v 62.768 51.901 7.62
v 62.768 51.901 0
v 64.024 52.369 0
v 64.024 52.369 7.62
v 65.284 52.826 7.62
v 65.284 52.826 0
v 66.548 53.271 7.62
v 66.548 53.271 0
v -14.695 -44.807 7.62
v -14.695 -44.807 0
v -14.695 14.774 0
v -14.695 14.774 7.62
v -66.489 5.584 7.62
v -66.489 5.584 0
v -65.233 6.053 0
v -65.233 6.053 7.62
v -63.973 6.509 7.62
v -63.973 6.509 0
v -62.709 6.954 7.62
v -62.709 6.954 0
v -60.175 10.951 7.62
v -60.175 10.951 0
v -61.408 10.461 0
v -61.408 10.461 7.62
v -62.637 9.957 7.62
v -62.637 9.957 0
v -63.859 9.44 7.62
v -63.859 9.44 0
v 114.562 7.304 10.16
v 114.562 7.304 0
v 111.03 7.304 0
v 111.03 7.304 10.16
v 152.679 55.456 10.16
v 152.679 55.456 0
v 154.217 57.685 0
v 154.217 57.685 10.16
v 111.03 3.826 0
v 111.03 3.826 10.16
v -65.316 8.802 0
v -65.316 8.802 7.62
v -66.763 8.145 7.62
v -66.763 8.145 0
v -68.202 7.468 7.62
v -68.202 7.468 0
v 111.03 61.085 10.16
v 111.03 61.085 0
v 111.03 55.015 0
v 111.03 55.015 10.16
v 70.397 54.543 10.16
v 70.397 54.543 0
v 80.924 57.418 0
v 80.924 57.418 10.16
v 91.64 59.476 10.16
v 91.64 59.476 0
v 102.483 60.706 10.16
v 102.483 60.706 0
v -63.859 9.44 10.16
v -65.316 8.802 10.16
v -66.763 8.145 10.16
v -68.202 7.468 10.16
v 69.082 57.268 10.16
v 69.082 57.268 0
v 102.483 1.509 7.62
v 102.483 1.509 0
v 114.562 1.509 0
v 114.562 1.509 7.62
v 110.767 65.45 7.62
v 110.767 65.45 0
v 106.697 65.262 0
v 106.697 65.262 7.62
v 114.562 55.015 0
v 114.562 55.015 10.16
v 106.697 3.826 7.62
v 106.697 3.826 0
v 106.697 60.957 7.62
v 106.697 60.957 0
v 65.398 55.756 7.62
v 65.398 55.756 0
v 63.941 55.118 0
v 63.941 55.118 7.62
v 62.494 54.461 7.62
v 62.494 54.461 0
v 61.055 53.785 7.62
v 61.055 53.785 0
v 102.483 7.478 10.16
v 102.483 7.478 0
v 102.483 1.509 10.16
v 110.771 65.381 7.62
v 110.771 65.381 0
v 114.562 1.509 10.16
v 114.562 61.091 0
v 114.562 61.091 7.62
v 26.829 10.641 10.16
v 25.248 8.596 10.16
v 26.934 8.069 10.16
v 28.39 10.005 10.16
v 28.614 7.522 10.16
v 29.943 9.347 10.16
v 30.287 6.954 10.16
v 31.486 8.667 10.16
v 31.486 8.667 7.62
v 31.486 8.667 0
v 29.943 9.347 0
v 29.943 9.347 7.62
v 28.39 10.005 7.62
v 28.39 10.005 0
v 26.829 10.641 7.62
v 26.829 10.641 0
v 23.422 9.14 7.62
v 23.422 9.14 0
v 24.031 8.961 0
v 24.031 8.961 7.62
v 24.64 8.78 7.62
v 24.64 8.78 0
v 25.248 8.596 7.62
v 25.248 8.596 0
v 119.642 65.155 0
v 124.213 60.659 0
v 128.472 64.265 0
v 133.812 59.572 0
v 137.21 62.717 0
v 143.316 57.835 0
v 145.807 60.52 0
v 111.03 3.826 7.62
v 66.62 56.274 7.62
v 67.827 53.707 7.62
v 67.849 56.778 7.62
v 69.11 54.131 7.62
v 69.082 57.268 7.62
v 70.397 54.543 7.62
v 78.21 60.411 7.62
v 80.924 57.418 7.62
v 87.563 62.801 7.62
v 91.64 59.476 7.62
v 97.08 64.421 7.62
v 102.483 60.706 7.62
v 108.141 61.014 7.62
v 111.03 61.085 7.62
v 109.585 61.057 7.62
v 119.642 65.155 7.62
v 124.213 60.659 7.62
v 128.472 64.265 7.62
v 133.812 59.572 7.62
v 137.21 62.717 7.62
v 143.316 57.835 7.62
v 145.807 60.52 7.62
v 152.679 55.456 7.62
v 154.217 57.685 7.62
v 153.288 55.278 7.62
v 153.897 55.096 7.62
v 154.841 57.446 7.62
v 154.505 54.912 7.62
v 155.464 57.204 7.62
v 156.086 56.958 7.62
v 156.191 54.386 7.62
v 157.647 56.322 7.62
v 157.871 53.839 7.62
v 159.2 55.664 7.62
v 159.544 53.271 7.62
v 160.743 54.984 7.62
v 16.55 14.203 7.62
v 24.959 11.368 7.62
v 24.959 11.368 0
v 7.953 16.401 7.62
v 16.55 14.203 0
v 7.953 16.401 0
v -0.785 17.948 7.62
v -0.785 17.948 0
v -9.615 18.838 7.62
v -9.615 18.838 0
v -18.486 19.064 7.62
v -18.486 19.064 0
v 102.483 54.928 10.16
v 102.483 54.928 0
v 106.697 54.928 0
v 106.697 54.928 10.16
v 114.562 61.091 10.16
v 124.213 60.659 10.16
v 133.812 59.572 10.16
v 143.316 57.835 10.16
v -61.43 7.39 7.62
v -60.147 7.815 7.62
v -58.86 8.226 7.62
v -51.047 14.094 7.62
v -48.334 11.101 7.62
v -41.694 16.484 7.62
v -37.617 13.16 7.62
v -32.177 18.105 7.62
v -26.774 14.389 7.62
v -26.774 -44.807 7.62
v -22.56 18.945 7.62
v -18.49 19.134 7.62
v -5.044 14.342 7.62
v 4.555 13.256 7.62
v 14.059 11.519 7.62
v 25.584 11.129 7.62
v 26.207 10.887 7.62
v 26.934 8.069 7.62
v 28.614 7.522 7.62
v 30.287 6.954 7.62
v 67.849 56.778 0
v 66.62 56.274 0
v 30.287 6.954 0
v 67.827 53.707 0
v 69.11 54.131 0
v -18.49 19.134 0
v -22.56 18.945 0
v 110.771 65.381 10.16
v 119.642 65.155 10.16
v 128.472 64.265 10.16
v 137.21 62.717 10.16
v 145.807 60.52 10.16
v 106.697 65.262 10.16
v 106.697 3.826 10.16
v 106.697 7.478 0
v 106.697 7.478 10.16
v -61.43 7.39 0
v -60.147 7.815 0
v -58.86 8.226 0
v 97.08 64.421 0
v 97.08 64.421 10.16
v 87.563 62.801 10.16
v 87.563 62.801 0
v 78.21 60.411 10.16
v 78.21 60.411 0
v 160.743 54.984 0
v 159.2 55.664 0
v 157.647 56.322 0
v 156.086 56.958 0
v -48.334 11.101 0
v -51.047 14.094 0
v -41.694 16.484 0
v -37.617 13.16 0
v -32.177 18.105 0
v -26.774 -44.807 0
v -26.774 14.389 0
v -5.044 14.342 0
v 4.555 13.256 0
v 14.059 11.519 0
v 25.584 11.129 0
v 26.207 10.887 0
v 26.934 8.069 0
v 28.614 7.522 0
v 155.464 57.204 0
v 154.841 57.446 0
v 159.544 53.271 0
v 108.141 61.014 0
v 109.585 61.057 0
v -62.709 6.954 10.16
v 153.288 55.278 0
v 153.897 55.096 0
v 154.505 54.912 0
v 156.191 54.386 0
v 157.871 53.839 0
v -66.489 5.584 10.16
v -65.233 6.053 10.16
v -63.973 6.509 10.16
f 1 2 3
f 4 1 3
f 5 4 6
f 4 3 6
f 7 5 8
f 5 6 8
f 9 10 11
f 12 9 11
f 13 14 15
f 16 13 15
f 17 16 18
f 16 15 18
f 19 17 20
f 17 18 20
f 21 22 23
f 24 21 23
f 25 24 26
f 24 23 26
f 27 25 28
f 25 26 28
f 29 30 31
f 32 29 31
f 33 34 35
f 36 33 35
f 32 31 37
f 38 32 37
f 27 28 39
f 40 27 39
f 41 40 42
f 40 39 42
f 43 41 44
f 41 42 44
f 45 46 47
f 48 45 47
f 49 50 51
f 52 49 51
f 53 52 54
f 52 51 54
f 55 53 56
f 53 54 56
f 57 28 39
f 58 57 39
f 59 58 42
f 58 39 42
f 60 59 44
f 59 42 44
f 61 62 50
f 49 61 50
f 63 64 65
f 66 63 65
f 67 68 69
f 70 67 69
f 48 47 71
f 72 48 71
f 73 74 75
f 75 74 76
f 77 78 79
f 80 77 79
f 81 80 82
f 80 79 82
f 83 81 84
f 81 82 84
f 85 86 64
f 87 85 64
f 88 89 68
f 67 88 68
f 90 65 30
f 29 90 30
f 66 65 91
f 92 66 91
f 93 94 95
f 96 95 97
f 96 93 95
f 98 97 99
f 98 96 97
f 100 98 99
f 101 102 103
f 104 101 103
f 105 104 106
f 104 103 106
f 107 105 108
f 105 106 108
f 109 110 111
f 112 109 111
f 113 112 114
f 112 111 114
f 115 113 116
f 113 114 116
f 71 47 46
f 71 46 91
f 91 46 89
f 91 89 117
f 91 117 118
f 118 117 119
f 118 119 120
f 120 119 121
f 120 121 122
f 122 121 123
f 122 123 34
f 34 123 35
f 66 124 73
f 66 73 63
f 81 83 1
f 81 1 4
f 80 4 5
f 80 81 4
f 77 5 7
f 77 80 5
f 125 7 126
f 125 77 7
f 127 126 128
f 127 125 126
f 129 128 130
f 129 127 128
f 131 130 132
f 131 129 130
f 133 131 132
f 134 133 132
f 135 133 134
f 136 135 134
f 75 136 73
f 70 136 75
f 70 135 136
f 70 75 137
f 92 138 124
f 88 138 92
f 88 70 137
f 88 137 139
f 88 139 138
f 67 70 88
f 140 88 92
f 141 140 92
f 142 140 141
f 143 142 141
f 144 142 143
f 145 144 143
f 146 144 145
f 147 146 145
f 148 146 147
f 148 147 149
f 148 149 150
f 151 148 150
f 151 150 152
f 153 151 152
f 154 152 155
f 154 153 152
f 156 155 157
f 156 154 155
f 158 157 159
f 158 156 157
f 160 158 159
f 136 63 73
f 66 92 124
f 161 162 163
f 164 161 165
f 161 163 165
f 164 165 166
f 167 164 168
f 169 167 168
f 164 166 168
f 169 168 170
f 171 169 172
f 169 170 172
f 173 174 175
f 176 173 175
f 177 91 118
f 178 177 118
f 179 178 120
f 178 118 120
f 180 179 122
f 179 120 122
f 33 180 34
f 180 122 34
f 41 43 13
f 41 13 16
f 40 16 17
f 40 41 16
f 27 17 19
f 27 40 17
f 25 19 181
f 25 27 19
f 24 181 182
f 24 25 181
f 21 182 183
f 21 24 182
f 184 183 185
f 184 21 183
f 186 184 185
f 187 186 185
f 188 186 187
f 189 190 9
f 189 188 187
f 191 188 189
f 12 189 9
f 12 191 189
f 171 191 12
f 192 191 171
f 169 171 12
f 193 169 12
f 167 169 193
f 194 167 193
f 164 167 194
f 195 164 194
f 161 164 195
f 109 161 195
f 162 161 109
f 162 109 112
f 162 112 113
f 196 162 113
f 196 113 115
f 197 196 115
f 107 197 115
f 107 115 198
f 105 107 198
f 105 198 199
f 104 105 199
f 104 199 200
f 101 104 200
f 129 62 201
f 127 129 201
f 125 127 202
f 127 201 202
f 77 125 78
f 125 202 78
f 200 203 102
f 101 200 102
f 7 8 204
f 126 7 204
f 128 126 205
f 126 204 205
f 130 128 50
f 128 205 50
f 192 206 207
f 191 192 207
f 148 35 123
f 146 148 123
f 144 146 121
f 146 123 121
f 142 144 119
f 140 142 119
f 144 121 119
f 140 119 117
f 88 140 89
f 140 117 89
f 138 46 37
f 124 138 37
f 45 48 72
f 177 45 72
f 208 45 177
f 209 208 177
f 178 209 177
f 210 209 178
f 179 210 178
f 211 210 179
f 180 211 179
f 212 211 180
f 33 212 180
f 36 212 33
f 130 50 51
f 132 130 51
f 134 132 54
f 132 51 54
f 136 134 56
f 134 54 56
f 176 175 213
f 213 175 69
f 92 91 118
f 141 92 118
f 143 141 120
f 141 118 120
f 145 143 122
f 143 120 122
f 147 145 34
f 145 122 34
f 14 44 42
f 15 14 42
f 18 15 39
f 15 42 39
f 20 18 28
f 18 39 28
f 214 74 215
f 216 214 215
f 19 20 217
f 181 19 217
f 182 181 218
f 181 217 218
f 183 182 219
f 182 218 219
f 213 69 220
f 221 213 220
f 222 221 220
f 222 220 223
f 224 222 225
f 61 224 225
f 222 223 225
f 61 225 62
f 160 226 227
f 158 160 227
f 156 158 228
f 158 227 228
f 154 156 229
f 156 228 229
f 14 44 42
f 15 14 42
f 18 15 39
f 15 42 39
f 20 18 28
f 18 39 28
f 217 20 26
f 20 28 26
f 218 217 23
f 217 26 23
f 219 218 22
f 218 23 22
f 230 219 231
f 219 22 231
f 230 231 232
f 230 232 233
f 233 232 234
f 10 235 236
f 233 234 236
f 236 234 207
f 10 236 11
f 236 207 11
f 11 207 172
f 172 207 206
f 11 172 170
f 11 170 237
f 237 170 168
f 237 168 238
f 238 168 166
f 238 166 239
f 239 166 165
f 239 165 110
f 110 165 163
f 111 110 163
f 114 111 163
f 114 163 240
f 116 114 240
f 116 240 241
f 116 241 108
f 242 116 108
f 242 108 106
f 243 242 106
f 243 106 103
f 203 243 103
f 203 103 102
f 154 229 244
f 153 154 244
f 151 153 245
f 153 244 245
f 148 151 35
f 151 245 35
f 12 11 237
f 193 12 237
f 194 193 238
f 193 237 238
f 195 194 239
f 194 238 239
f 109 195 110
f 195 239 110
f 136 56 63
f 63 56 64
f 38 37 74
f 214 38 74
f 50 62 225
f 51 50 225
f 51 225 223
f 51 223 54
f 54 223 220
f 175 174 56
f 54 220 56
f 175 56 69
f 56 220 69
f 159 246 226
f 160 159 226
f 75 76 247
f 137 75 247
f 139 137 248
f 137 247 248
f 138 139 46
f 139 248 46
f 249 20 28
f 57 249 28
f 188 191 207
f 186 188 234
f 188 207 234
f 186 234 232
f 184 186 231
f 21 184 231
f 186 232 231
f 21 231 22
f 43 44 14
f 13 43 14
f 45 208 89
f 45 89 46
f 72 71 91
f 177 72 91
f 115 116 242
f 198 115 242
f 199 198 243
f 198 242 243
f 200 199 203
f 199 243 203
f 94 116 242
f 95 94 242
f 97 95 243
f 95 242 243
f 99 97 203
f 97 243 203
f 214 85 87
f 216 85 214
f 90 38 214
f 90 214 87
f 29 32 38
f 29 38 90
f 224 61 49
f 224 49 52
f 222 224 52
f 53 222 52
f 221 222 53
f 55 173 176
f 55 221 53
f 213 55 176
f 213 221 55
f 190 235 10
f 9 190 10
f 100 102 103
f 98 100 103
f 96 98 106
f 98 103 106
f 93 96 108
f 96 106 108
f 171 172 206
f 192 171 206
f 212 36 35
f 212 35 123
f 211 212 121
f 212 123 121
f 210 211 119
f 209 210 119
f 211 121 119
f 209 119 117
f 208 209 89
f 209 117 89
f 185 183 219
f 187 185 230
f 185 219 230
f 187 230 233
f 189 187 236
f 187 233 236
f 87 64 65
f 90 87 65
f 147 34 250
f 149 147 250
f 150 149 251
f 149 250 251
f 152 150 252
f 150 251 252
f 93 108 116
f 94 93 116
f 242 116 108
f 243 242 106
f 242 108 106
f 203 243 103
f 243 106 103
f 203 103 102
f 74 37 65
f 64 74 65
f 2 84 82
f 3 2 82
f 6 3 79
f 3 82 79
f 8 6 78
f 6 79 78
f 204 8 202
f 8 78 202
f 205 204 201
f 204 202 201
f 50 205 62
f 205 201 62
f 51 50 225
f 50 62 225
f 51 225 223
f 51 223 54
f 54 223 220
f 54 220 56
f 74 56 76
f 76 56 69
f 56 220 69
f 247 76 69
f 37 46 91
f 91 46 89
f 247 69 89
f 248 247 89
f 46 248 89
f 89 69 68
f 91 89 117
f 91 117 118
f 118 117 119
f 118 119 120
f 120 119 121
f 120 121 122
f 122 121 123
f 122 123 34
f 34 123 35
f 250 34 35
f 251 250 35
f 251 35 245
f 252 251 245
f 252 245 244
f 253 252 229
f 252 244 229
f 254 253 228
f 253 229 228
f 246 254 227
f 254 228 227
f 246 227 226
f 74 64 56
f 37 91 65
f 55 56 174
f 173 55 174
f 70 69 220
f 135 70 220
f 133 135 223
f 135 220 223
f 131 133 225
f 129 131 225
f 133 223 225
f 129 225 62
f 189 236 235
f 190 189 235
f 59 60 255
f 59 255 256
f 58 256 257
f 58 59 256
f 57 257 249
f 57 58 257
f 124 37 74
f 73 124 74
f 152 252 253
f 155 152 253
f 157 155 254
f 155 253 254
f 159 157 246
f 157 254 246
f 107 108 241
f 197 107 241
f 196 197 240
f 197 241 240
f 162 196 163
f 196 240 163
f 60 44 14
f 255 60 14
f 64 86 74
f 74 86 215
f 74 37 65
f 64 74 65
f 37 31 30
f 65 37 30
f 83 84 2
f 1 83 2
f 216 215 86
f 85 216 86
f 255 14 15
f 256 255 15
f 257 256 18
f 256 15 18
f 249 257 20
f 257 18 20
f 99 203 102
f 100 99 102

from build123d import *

# Parameters (mm, degrees)
F1_DEPTH = 10.16
F2_DEPTH = 7.62
F0_W     = 3.5319058225
F0_H     = 47.7113383822
F0_W_2   = 4.2136191335
F0_H_2   = 47.4496674724


with BuildPart() as f1:
    # F0 (on Top) → F1 (new body)
    with BuildSketch(Plane.XY):
        with BuildLine():
            Line((-62.7086196105, 6.9542019628), (-63.859421589, 9.4395052171))
            ThreePointArc((-63.859421589, 9.4395052171), (-66.0405740146, 8.4756323991), (-68.2018846273, 7.4680545367))
            Line((-68.2018846273, 7.4680545367), (-66.4890483022, 5.583927501))
            ThreePointArc((-66.4890483022, 5.583927501), (-64.6036842406, 6.282446105), (-62.7086196105, 6.9542019628))
        make_face()
    extrude(amount=F1_DEPTH)


with BuildPart() as f1b:
    # F0 (on Top) → F1, piece 2 (new body)
    with BuildSketch(Plane.XY):
        with BuildLine():
            Line((30.2866194397, 6.9542019628), (31.4856059849, 8.6670452729))
            ThreePointArc((31.4856059849, 8.6670452729), (29.1676409192, 9.6788361604), (26.828605468, 10.6409151614))
            Line((26.828605468, 10.6409151614), (25.2478323508, 8.5956327954))
            ThreePointArc((25.2478323508, 8.5956327954), (27.774883266, 7.7984236152), (30.2866194397, 6.9542019628))
        make_face()
    extrude(amount=F1_DEPTH)


with BuildPart() as f1c:
    # F0 (on Top) → F1, piece 3 (new body)
    with BuildSketch(Plane.XY):
        with BuildLine():
            Line((106.6968534909, 60.9568862112), (106.6968534909, 65.2615321239))
            ThreePointArc((106.6968534909, 65.2615321239), (87.5631710955, 62.8008556066), (69.0824986497, 57.2675494628))
            Line((69.0824986497, 57.2675494628), (70.3966033264, 54.5431568671))
            ThreePointArc((70.3966033264, 54.5431568671), (86.2621022387, 58.5502032273), (102.4832343575, 60.7055104108))
            ThreePointArc((102.4832343575, 60.7055104108), (104.5891098819, 60.8468549434), (106.6968534909, 60.9568862112))
        make_face()
        with BuildLine():
            Line((106.6968534909, 54.9276508391), (106.6968534909, 60.9568862112))
            ThreePointArc((106.6968534909, 60.9568862112), (104.5891098819, 60.8468549434), (102.4832343575, 60.7055104108))
            Line((102.4832343575, 60.7055104108), (102.4832343575, 54.9276508391))
            Line((102.4832343575, 54.9276508391), (106.6968534909, 54.9276508391))
        make_face()
    extrude(amount=F1_DEPTH)


with BuildPart() as f1d:
    # F0 (on Top) → F1, piece 4 (new body)
    with BuildSketch(Plane.XY):
        with BuildLine():
            Line((152.679021715, 55.456282163), (154.2165289348, 57.684894801))
            ThreePointArc((154.2165289348, 57.684894801), (132.855125745, 63.57305995), (110.7708962956, 65.3805014253))
            Line((110.7708962956, 65.3805014253), (111.0299568016, 61.084581168))
            ThreePointArc((111.0299568016, 61.084581168), (112.7958903679, 61.0986729433), (114.561862624, 61.090803419))
            ThreePointArc((114.561862624, 61.090803419), (133.8124309807, 59.5723342457), (152.679021715, 55.456282163))
        make_face()
        with BuildLine():
            ThreePointArc((114.561862624, 61.090803419), (112.7958903679, 61.0986729433), (111.0299568016, 61.084581168))
            Line((111.0299568016, 61.084581168), (111.0299568016, 55.0148747861))
            Line((111.0299568016, 55.0148747861), (114.561862624, 55.0148747861))
            Line((114.561862624, 55.0148747861), (114.561862624, 61.090803419))
        make_face()
    extrude(amount=F1_DEPTH)


with BuildPart() as f1e:
    # F0 (on Top) → F1, piece 5 (new body)
    with BuildSketch(Plane.XY):
        Polygon((114.561862624, 7.3035364039), (111.0299568016, 7.3035364039), (111.0299568016, 3.8255042981), (106.6968534909, 3.8255042981), (106.6968534909, 7.4779833667), (102.4832343575, 7.4779833667), (102.4832343575, 1.5092226963), (114.561862624, 1.5092226963), align=None)
    extrude(amount=F1_DEPTH)


with BuildPart() as f2:
    # F0 (on Top) → F2 (new body)
    with BuildSketch(Plane.XY):
        with BuildLine():
            Line((30.2866194397, 6.9542019628), (31.4856059849, 8.6670452729))
            ThreePointArc((31.4856059849, 8.6670452729), (29.1676409192, 9.6788361604), (26.828605468, 10.6409151614))
            Line((26.828605468, 10.6409151614), (25.2478323508, 8.5956327954))
            ThreePointArc((25.2478323508, 8.5956327954), (27.774883266, 7.7984236152), (30.2866194397, 6.9542019628))
        make_face()
        with BuildLine():
            Line((25.2478323508, 8.5956327954), (26.828605468, 10.6409151614))
            ThreePointArc((26.828605468, 10.6409151614), (25.8955702873, 11.0085224522), (24.9594568597, 11.3682187401))
            Line((24.9594568597, 11.3682187401), (23.4219496399, 9.139606102))
            ThreePointArc((23.4219496399, 9.139606102), (24.3358032445, 8.8706814738), (25.2478323508, 8.5956327954))
        make_face()
        with BuildLine():
            Line((23.4219496399, 9.139606102), (24.9594568597, 11.3682187401))
            ThreePointArc((24.9594568597, 11.3682187401), (3.5980536699, 17.256383889), (-18.4861757794, 19.0638253644))
            Line((-18.4861757794, 19.0638253644), (-18.2271152735, 14.7679051071))
            ThreePointArc((-18.2271152735, 14.7679051071), (-16.4611817071, 14.7819968824), (-14.695209451, 14.7741273581))
            ThreePointArc((-14.695209451, 14.7741273581), (4.5553589056, 13.2556581848), (23.4219496399, 9.139606102))
        make_face()
        with BuildLine():
            Line((-18.2271152735, 14.7679051071), (-18.4861757794, 19.0638253644))
            ThreePointArc((-18.4861757794, 19.0638253644), (-20.5237088277, 19.021861767), (-22.5602185841, 18.9448560629))
            Line((-22.5602185841, 18.9448560629), (-22.5602185841, 14.6402101502))
            ThreePointArc((-22.5602185841, 14.6402101502), (-20.3941542092, 14.7205926299), (-18.2271152735, 14.7679051071))
        make_face()
        with BuildLine():
            ThreePointArc((-22.5602185841, 18.9448560629), (-20.5237088277, 19.021861767), (-18.4861757794, 19.0638253644))
            Line((-18.4861757794, 19.0638253644), (-18.4903963532, 19.1338138341))
            Line((-18.4903963532, 19.1338138341), (-22.5602185841, 18.9448560629))
        make_face()
        with BuildLine():
            Line((-22.5602185841, 14.6402101502), (-22.5602185841, 18.9448560629))
            ThreePointArc((-22.5602185841, 18.9448560629), (-41.6939009795, 16.4841795457), (-60.1745734254, 10.9508734019))
            Line((-60.1745734254, 10.9508734019), (-58.8604687486, 8.2264808061))
            ThreePointArc((-58.8604687486, 8.2264808061), (-42.9949698363, 12.2335271664), (-26.7738377176, 14.3888343499))
            ThreePointArc((-26.7738377176, 14.3888343499), (-24.6679621931, 14.5301788825), (-22.5602185841, 14.6402101502))
        make_face()
        with BuildLine():
            ThreePointArc((-14.695209451, 14.7741273581), (-16.4611817071, 14.7819968824), (-18.2271152735, 14.7679051071))
            Line((-18.2271152735, 14.7679051071), (-18.2271152735, -42.4911717629))
            Line((-18.2271152735, -42.4911717629), (-22.5602185841, -42.4911717629))
            Line((-22.5602185841, -42.4911717629), (-22.5602185841, 14.6402101502))
            ThreePointArc((-22.5602185841, 14.6402101502), (-24.6679621931, 14.5301788825), (-26.7738377176, 14.3888343499))
            Line((-26.7738377176, 14.3888343499), (-26.7738377176, -44.8074533647))
            Line((-26.7738377176, -44.8074533647), (-14.695209451, -44.8074533647))
            Line((-14.695209451, -44.8074533647), (-14.695209451, 14.7741273581))
        make_face()
        with BuildLine():
            Line((-58.8604687486, 8.2264808061), (-60.1745734254, 10.9508734019))
            ThreePointArc((-60.1745734254, 10.9508734019), (-62.0233490085, 10.2106748268), (-63.859421589, 9.4395052171))
            Line((-63.859421589, 9.4395052171), (-62.7086196105, 6.9542019628))
            ThreePointArc((-62.7086196105, 6.9542019628), (-60.789083338, 7.6040705812), (-58.8604687486, 8.2264808061))
        make_face()
        with BuildLine():
            Line((-62.7086196105, 6.9542019628), (-63.859421589, 9.4395052171))
            ThreePointArc((-63.859421589, 9.4395052171), (-66.0405740146, 8.4756323991), (-68.2018846273, 7.4680545367))
            Line((-68.2018846273, 7.4680545367), (-66.4890483022, 5.583927501))
            ThreePointArc((-66.4890483022, 5.583927501), (-64.6036842406, 6.282446105), (-62.7086196105, 6.9542019628))
        make_face()
        with BuildLine():
            Line((-18.2271152735, -42.4911717629), (-18.2271152735, 14.7679051071))
            ThreePointArc((-18.2271152735, 14.7679051071), (-20.3941542092, 14.7205926299), (-22.5602185841, 14.6402101502))
            Line((-22.5602185841, 14.6402101502), (-22.5602185841, -42.4911717629))
            Line((-22.5602185841, -42.4911717629), (-18.2271152735, -42.4911717629))
        make_face()
    extrude(amount=F2_DEPTH)


with BuildPart() as f2b:
    # F0 (on Top) → F2, piece 2 (new body)
    with BuildSketch(Plane.XY):
        with BuildLine():
            Line((159.5436915147, 53.2708780237), (160.74267806, 54.9837213338))
            ThreePointArc((160.74267806, 54.9837213338), (158.4247129942, 55.9955122214), (156.085677543, 56.9575912223))
            Line((156.085677543, 56.9575912223), (154.5049044258, 54.9123088564))
            ThreePointArc((154.5049044258, 54.9123088564), (157.031955341, 54.1150996761), (159.5436915147, 53.2708780237))
        make_face()
        with BuildLine():
            Line((154.5049044258, 54.9123088564), (156.085677543, 56.9575912223))
            ThreePointArc((156.085677543, 56.9575912223), (155.1526423623, 57.3251985131), (154.2165289348, 57.684894801))
            Line((154.2165289348, 57.684894801), (152.679021715, 55.456282163))
            ThreePointArc((152.679021715, 55.456282163), (153.5928753195, 55.1873575348), (154.5049044258, 54.9123088564))
        make_face()
        with BuildLine():
            Line((152.679021715, 55.456282163), (154.2165289348, 57.684894801))
            ThreePointArc((154.2165289348, 57.684894801), (132.855125745, 63.57305995), (110.7708962956, 65.3805014253))
            Line((110.7708962956, 65.3805014253), (111.0299568016, 61.084581168))
            ThreePointArc((111.0299568016, 61.084581168), (112.7958903679, 61.0986729433), (114.561862624, 61.090803419))
            ThreePointArc((114.561862624, 61.090803419), (133.8124309807, 59.5723342457), (152.679021715, 55.456282163))
        make_face()
        with BuildLine():
            Line((111.0299568016, 61.084581168), (110.7708962956, 65.3805014253))
            ThreePointArc((110.7708962956, 65.3805014253), (108.7333632473, 65.338537828), (106.6968534909, 65.2615321239))
            Line((106.6968534909, 65.2615321239), (106.6968534909, 60.9568862112))
            ThreePointArc((106.6968534909, 60.9568862112), (108.8629178658, 61.0372686908), (111.0299568016, 61.084581168))
        make_face()
        with BuildLine():
            ThreePointArc((106.6968534909, 65.2615321239), (108.7333632473, 65.338537828), (110.7708962956, 65.3805014253))
            Line((110.7708962956, 65.3805014253), (110.7666757218, 65.4504898951))
            Line((110.7666757218, 65.4504898951), (106.6968534909, 65.2615321239))
        make_face()
        with BuildLine():
            Line((106.6968534909, 60.9568862112), (106.6968534909, 65.2615321239))
            ThreePointArc((106.6968534909, 65.2615321239), (87.5631710955, 62.8008556066), (69.0824986497, 57.2675494628))
            Line((69.0824986497, 57.2675494628), (70.3966033264, 54.5431568671))
            ThreePointArc((70.3966033264, 54.5431568671), (86.2621022387, 58.5502032273), (102.4832343575, 60.7055104108))
            ThreePointArc((102.4832343575, 60.7055104108), (104.5891098819, 60.8468549434), (106.6968534909, 60.9568862112))
        make_face()
        with BuildLine():
            ThreePointArc((114.561862624, 61.090803419), (112.7958903679, 61.0986729433), (111.0299568016, 61.084581168))
            Line((111.0299568016, 61.084581168), (111.0299568016, 55.0148747861))
            Line((111.0299568016, 55.0148747861), (114.561862624, 55.0148747861))
            Line((114.561862624, 55.0148747861), (114.561862624, 61.090803419))
        make_face()
        with BuildLine():
            Line((70.3966033264, 54.5431568671), (69.0824986497, 57.2675494628))
            ThreePointArc((69.0824986497, 57.2675494628), (67.2337230665, 56.5273508877), (65.3976504861, 55.7561812781))
            Line((65.3976504861, 55.7561812781), (66.5484524645, 53.2708780237))
            ThreePointArc((66.5484524645, 53.2708780237), (68.467988737, 53.9207466422), (70.3966033264, 54.5431568671))
        make_face()
        with BuildLine():
            Line((106.6968534909, 54.9276508391), (106.6968534909, 60.9568862112))
            ThreePointArc((106.6968534909, 60.9568862112), (104.5891098819, 60.8468549434), (102.4832343575, 60.7055104108))
            Line((102.4832343575, 60.7055104108), (102.4832343575, 54.9276508391))
            Line((102.4832343575, 54.9276508391), (106.6968534909, 54.9276508391))
        make_face()
        with Locations((112.7959097128, 31.159205595)):
            Rectangle(F0_W, F0_H)
        with BuildLine():
            Line((66.5484524645, 53.2708780237), (65.3976504861, 55.7561812781))
            ThreePointArc((65.3976504861, 55.7561812781), (63.2164980604, 54.7923084601), (61.0551874477, 53.7847305977))
            Line((61.0551874477, 53.7847305977), (62.7680237729, 51.9006035619))
            ThreePointArc((62.7680237729, 51.9006035619), (64.6533878344, 52.599122166), (66.5484524645, 53.2708780237))
        make_face()
        with Locations((104.5900439242, 31.2028171029)):
            Rectangle(F0_W_2, F0_H_2)
        Polygon((114.561862624, 7.3035364039), (111.0299568016, 7.3035364039), (111.0299568016, 3.8255042981), (106.6968534909, 3.8255042981), (106.6968534909, 7.4779833667), (102.4832343575, 7.4779833667), (102.4832343575, 1.5092226963), (114.561862624, 1.5092226963), align=None)
    extrude(amount=F2_DEPTH)


solid = Compound([f1.part, f1b.part, f1c.part, f1d.part, f1e.part, f2.part, f2b.part])
